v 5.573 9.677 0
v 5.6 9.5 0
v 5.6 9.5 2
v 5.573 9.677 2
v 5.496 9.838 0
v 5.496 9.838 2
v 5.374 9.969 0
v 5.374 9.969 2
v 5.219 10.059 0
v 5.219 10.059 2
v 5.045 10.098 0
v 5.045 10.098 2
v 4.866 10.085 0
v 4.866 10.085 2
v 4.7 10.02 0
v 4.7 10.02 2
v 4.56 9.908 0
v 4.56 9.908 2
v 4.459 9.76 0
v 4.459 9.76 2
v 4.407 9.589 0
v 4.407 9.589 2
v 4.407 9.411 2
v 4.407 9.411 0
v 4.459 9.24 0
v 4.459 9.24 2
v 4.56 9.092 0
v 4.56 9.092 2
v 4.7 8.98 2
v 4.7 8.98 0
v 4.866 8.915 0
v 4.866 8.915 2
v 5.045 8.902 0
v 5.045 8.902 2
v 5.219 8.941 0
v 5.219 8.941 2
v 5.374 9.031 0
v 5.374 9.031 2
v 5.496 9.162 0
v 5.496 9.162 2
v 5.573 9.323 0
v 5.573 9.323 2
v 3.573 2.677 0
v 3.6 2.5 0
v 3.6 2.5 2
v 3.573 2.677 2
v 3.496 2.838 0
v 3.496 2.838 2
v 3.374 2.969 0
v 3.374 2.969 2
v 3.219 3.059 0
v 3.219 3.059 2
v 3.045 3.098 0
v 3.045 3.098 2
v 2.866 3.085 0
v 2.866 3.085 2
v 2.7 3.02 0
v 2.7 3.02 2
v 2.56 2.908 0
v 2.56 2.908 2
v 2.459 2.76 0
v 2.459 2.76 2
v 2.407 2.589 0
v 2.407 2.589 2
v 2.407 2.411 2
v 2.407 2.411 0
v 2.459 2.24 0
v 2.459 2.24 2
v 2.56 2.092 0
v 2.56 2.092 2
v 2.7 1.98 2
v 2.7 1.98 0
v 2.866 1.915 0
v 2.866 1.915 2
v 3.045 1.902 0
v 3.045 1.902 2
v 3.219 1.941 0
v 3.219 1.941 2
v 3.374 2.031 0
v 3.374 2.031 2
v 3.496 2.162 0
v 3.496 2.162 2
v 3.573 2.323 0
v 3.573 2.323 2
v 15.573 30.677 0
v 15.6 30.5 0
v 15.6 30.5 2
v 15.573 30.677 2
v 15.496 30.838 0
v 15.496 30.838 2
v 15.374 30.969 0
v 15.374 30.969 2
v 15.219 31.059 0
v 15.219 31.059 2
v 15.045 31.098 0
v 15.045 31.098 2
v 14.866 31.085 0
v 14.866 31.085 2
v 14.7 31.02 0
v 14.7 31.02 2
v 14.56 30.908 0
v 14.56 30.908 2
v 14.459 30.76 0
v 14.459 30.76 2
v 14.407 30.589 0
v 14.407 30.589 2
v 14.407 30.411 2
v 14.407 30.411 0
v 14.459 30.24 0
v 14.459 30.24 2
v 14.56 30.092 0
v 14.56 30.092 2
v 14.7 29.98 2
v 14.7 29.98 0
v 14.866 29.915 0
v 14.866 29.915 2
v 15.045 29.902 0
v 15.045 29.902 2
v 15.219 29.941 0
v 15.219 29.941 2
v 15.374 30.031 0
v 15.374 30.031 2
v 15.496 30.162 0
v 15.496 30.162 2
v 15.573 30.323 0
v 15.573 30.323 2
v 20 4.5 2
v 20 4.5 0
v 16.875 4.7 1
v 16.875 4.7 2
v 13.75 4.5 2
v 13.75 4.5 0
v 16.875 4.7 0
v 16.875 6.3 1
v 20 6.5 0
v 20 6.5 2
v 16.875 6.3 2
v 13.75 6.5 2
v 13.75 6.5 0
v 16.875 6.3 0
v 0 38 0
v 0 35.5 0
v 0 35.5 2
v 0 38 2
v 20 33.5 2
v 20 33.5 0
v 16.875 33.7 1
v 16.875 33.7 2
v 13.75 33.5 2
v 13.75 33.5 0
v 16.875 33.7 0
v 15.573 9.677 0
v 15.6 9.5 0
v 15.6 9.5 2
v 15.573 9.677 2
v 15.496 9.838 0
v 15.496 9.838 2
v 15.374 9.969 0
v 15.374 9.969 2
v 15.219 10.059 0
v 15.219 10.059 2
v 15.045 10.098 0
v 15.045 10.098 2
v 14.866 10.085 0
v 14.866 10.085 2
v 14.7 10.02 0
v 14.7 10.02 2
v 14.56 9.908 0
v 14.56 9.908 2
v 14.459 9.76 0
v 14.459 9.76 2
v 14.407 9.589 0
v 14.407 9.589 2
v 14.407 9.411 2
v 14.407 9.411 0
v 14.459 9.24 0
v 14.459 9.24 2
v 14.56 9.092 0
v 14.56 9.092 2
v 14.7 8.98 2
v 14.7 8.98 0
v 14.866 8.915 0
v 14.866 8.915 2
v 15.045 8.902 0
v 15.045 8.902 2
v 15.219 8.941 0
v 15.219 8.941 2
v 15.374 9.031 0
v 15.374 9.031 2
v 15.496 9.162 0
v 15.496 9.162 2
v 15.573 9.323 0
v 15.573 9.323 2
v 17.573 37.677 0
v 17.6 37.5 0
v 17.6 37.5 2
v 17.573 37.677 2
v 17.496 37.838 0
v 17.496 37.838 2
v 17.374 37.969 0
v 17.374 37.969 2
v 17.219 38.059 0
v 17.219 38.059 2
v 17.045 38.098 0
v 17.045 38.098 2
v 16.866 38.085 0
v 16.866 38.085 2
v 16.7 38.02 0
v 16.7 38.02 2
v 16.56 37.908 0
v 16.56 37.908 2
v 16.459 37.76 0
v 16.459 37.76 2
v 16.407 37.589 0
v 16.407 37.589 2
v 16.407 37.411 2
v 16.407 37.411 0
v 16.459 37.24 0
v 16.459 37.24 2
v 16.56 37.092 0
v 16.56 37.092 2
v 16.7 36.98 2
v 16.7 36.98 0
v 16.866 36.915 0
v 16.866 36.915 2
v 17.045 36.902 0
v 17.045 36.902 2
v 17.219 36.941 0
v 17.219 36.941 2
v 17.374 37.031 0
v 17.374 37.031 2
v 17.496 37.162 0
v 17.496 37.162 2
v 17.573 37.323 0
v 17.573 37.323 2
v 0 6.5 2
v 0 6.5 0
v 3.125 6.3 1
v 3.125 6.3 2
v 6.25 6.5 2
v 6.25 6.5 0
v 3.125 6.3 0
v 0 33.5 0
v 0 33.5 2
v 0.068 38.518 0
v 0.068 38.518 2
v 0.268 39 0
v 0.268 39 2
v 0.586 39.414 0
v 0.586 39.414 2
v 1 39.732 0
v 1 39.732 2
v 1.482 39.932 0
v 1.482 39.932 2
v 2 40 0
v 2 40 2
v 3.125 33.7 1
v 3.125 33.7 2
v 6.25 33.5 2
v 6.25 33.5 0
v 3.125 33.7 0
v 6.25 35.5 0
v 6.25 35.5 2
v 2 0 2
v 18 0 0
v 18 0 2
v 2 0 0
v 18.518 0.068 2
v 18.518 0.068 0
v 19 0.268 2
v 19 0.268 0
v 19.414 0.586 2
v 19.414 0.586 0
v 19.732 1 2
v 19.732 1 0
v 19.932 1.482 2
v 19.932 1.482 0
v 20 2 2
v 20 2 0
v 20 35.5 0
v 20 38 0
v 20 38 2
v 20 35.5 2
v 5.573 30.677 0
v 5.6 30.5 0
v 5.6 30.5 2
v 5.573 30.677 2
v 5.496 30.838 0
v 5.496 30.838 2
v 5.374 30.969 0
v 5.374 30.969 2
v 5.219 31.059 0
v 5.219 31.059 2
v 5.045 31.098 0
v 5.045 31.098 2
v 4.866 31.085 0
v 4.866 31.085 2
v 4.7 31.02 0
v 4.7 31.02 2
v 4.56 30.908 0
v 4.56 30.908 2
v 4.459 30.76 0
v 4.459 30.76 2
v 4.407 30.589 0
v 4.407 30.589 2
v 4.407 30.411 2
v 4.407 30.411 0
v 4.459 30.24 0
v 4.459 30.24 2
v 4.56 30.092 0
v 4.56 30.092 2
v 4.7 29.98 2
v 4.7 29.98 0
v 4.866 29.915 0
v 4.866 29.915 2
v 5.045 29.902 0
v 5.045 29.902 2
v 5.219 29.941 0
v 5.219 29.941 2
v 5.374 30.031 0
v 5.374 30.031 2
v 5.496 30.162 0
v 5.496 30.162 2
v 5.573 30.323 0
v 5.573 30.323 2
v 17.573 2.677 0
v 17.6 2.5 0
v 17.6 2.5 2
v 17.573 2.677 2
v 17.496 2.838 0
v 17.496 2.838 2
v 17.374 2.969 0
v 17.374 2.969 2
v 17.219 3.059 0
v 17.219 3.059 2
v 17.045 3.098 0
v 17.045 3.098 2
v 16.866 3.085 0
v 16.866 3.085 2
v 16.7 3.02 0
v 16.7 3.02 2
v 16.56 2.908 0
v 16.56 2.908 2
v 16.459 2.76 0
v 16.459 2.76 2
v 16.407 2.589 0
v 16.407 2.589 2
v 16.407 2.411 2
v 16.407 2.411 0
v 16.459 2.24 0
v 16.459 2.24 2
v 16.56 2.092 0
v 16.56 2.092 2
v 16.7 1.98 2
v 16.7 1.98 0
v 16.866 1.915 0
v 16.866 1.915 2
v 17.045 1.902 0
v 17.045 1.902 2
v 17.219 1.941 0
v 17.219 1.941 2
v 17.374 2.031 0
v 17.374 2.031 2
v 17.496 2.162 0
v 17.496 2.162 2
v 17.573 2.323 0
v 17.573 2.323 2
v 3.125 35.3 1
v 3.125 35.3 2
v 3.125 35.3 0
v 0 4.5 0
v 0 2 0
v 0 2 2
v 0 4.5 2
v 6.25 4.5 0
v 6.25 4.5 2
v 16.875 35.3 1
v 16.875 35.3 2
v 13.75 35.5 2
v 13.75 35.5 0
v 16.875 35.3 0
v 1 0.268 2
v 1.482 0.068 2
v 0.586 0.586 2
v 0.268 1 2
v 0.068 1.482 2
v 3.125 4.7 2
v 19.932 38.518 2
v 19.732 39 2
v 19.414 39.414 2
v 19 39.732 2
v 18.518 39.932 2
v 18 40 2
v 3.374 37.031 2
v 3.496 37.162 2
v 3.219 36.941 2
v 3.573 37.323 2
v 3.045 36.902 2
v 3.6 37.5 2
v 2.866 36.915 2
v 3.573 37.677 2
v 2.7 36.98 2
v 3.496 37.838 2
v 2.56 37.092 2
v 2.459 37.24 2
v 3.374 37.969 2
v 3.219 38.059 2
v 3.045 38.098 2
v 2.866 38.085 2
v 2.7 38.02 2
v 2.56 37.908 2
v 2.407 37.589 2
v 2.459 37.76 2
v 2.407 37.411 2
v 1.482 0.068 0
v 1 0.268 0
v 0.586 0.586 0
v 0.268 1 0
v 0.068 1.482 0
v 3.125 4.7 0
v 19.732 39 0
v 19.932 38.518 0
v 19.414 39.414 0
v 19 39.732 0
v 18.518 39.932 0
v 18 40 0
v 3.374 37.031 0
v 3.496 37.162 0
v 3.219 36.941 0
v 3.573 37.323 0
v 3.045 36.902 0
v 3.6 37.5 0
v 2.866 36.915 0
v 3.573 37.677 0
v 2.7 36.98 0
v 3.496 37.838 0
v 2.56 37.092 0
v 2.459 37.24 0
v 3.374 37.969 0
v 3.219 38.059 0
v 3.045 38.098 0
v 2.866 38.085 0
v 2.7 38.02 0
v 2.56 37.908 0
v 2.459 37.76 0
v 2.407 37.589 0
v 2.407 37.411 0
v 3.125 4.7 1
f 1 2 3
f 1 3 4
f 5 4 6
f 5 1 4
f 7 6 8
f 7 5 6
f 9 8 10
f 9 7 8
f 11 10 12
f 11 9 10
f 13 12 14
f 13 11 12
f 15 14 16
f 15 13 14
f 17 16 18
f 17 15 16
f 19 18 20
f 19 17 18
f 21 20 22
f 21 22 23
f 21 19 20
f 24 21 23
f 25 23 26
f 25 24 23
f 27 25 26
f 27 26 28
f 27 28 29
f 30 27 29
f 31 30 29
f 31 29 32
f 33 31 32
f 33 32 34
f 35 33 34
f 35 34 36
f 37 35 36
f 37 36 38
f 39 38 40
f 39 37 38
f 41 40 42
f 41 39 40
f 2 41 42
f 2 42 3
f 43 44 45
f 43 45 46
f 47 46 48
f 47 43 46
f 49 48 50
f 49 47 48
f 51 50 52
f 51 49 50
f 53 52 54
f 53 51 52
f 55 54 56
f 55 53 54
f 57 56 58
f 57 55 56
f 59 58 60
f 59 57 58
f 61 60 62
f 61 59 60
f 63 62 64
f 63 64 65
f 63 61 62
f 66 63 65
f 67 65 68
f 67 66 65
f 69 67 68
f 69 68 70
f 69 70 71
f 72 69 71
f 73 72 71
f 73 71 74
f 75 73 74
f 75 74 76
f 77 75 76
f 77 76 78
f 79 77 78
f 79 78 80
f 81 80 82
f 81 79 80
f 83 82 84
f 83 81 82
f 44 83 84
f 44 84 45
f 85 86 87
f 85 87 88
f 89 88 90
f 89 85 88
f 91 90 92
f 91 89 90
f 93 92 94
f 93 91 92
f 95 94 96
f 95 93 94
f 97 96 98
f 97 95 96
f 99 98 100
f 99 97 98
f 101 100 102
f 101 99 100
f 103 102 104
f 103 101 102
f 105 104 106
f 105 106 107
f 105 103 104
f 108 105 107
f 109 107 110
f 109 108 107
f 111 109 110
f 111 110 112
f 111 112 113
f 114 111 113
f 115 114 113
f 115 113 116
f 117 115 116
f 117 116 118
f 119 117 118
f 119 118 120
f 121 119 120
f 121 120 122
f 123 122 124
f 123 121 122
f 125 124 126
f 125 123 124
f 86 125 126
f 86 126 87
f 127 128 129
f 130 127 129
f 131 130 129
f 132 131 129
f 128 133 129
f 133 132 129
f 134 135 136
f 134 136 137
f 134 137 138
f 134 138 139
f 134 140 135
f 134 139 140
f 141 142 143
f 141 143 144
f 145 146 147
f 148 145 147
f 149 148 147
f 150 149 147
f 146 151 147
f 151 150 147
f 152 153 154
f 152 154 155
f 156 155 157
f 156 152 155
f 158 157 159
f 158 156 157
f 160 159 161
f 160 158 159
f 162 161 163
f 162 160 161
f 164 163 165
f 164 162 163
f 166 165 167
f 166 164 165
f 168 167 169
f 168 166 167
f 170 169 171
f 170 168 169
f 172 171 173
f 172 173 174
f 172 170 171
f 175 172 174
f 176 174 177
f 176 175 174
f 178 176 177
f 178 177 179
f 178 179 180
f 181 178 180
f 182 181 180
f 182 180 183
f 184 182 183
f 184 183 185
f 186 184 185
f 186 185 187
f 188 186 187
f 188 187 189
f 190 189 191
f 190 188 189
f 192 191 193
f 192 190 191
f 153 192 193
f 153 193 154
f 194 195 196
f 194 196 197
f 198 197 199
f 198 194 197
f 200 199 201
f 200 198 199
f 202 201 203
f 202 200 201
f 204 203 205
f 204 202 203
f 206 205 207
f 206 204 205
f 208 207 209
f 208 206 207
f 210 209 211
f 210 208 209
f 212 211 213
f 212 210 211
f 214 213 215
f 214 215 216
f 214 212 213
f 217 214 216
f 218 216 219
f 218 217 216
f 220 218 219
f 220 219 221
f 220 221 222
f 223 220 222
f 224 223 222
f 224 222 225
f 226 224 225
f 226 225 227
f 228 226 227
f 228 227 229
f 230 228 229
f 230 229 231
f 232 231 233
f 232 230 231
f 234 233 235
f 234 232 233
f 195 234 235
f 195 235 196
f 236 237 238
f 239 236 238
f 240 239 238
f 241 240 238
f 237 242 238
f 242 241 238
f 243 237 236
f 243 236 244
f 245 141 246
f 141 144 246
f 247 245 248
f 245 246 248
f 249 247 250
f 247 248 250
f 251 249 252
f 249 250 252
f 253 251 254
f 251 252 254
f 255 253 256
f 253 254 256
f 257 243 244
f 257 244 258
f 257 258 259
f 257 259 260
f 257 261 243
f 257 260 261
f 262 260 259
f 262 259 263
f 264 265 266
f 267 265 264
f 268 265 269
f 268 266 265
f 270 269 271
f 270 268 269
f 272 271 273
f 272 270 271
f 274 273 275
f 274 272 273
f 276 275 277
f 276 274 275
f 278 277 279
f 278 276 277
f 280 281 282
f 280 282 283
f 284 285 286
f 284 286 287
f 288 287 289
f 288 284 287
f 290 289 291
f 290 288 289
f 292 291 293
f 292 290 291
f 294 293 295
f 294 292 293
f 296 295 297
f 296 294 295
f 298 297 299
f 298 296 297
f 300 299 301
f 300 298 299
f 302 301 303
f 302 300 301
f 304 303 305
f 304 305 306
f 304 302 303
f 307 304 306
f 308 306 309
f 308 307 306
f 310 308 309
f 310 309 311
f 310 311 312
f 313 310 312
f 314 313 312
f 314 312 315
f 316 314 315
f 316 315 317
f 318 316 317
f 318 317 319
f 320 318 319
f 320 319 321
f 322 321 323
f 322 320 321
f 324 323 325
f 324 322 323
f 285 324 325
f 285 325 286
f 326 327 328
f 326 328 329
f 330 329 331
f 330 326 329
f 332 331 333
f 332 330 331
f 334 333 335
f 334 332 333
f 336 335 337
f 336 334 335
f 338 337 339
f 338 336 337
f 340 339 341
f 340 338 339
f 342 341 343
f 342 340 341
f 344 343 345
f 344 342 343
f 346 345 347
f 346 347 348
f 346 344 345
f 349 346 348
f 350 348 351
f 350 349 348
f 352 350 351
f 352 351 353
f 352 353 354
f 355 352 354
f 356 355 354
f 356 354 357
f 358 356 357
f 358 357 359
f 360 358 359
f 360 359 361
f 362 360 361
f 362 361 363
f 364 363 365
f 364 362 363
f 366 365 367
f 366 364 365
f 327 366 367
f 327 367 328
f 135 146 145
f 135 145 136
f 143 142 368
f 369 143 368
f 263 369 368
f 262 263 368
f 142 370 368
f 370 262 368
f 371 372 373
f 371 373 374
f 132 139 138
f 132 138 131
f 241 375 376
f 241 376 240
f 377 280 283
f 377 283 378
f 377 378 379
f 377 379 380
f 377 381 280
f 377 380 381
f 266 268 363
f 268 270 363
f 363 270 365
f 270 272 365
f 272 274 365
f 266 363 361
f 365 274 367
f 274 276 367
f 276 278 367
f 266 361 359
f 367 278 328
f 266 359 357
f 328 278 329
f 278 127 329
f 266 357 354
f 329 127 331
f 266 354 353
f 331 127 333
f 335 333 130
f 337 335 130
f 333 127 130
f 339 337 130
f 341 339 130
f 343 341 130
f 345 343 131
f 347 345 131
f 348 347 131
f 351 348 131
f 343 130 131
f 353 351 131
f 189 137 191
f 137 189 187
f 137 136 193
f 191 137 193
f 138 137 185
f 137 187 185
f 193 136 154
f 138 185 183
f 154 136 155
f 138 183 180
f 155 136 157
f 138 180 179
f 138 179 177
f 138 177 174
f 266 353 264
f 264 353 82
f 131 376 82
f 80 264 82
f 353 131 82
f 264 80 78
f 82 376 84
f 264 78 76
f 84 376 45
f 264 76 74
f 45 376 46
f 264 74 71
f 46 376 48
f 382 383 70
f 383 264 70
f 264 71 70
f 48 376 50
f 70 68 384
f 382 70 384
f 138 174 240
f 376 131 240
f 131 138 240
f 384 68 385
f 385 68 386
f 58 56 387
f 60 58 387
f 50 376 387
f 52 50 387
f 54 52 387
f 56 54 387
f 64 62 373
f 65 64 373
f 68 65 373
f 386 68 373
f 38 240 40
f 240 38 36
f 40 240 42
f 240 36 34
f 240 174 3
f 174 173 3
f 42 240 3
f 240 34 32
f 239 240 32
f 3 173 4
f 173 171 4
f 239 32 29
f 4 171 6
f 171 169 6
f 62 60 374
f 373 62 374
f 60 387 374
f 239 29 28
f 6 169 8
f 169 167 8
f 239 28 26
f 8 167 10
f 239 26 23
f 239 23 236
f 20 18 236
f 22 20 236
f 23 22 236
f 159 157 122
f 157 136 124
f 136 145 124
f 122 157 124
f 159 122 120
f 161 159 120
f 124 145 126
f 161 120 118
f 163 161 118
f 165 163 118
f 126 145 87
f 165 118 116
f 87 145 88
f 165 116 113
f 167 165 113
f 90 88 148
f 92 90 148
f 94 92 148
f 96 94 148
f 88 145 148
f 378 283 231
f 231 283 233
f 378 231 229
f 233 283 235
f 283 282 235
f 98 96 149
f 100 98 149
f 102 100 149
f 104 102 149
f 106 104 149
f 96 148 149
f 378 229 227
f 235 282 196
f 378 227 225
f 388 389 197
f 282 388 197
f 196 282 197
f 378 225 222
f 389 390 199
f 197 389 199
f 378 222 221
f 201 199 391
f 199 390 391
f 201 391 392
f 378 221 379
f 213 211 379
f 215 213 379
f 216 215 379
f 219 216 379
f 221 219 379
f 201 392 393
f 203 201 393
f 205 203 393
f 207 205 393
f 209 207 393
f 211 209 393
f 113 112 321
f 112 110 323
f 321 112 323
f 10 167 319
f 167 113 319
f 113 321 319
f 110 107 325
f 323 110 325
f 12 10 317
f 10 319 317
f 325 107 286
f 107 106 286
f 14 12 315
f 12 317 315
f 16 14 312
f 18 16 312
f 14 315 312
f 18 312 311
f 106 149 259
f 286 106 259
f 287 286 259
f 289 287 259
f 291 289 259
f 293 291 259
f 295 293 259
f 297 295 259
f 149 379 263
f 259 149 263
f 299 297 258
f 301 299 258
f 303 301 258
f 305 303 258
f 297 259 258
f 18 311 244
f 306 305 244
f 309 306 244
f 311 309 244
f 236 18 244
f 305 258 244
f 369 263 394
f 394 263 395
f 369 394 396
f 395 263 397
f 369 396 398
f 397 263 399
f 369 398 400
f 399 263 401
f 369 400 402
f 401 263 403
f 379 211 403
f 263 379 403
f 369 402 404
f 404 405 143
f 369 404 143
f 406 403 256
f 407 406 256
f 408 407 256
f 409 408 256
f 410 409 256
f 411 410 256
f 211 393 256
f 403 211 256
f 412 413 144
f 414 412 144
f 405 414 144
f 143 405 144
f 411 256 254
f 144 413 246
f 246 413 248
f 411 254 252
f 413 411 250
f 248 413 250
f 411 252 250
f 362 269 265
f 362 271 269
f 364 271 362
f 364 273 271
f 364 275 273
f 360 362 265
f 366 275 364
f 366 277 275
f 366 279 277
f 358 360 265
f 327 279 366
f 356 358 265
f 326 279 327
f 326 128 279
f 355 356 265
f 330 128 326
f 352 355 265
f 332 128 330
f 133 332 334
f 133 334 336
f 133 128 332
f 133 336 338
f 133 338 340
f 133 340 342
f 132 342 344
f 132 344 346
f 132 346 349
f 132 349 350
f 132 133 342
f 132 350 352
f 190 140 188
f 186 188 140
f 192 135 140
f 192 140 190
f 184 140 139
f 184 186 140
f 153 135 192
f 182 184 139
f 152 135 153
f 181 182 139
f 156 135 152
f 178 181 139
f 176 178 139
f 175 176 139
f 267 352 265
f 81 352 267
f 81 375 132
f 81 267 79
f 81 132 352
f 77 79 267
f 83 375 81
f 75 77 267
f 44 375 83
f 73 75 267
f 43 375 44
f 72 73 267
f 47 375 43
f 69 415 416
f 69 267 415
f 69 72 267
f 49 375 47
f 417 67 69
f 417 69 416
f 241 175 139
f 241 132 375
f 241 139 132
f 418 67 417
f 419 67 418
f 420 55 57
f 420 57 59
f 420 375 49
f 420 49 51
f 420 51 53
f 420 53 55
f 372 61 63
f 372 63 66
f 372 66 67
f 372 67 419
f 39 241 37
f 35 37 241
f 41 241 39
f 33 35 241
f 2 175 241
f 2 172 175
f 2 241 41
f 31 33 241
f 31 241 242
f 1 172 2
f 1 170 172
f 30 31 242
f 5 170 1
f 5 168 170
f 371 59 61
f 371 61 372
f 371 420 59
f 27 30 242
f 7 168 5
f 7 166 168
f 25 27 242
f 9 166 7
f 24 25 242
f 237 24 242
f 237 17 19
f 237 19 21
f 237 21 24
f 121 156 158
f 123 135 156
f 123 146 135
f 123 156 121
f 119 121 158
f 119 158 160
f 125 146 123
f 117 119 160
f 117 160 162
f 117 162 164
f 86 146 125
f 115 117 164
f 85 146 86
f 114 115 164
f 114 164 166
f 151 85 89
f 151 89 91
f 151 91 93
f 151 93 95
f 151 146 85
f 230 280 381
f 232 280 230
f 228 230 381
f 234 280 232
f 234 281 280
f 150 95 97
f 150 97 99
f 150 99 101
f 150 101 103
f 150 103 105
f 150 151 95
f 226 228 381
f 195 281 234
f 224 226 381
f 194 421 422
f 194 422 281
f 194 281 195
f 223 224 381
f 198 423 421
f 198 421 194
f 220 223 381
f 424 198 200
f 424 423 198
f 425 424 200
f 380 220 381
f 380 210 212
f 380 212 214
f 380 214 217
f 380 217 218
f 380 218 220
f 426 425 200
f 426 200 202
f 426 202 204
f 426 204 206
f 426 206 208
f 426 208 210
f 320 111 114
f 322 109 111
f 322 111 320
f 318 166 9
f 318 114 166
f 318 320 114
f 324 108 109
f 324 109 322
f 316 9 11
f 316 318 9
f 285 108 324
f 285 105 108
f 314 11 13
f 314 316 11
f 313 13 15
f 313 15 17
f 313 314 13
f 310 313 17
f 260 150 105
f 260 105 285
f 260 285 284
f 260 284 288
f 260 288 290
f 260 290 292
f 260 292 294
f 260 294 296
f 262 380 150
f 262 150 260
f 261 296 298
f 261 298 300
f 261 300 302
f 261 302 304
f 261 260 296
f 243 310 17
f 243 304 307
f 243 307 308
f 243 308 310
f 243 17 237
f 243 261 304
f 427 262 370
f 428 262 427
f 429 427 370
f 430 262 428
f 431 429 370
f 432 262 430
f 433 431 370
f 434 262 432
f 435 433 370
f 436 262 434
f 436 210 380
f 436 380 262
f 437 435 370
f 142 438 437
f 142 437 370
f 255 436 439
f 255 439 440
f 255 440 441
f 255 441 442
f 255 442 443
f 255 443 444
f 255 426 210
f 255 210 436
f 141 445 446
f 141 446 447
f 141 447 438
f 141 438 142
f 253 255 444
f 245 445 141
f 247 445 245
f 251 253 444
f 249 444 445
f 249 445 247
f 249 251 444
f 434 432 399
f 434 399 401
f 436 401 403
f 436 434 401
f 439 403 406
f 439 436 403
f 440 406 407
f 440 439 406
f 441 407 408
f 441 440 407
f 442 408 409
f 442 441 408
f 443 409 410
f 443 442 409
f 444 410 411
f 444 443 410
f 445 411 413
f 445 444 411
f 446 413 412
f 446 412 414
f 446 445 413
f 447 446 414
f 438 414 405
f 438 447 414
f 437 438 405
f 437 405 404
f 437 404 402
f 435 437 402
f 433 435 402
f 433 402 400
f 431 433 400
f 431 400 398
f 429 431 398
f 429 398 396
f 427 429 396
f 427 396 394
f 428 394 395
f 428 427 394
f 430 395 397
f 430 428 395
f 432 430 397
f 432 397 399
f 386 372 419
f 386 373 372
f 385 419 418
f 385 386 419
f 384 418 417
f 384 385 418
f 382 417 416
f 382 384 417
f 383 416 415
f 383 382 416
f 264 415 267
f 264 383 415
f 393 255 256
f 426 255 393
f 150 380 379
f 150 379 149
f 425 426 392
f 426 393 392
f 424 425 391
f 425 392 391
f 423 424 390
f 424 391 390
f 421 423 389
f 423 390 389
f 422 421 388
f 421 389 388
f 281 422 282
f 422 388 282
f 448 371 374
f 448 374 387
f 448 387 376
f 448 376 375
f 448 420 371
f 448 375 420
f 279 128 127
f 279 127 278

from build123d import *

# Parameters (mm, degrees)
SKETCH1_R               = 0.6
FINGER_PIP_BODY_DEPTH   = 2
FINGER_PIP_CONTOURING_R = 2


with BuildPart() as part:
    # Sketch1 → Finger PIP Body (new body)
    with BuildSketch(Plane.XY):
        with BuildLine():
            Line((0, 6.5), (0, 33.5))
            add(Edge.make_bspline(
                [(0, 33.5), (3.125, 33.9), (6.25, 33.5)],
                knots=[0, 0, 0, 1, 1, 1], degree=2))
            Line((6.25, 33.5), (6.25, 35.5))
            add(Edge.make_bspline(
                [(0, 35.5), (3.125, 35.1), (6.25, 35.5)],
                knots=[0, 0, 0, 1, 1, 1], degree=2))
            Line((0, 35.5), (0, 40))
            Line((0, 40), (20, 40))
            Line((20, 40), (20, 35.5))
            add(Edge.make_bspline(
                [(20, 35.5), (16.875, 35.1), (13.75, 35.5)],
                knots=[0, 0, 0, 1, 1, 1], degree=2))
            Line((13.75, 35.5), (13.75, 33.5))
            add(Edge.make_bspline(
                [(20, 33.5), (16.875, 33.9), (13.75, 33.5)],
                knots=[0, 0, 0, 1, 1, 1], degree=2))
            Line((20, 33.5), (20, 6.5))
            add(Edge.make_bspline(
                [(20, 6.5), (16.875, 6.1), (13.75, 6.5)],
                knots=[0, 0, 0, 1, 1, 1], degree=2))
            Line((13.75, 6.5), (13.75, 4.5))
            add(Edge.make_bspline(
                [(20, 4.5), (16.875, 4.9), (13.75, 4.5)],
                knots=[0, 0, 0, 1, 1, 1], degree=2))
            Line((20, 4.5), (20, 0))
            Line((20, 0), (0, 0))
            Line((0, 0), (0, 4.5))
            add(Edge.make_bspline(
                [(0, 4.5), (3.125, 4.9), (6.25, 4.5)],
                knots=[0, 0, 0, 1, 1, 1], degree=2))
            Line((6.25, 4.5), (6.25, 6.5))
            add(Edge.make_bspline(
                [(0, 6.5), (3.125, 6.1), (6.25, 6.5)],
                knots=[0, 0, 0, 1, 1, 1], degree=2))
        make_face()
        with Locations((3, 2.5)):
            Circle(SKETCH1_R, mode=Mode.SUBTRACT)
        with Locations((5, 9.5)):
            Circle(SKETCH1_R, mode=Mode.SUBTRACT)
        with Locations((5, 30.5)):
            Circle(SKETCH1_R, mode=Mode.SUBTRACT)
        with Locations((3, 37.5)):
            Circle(SKETCH1_R, mode=Mode.SUBTRACT)
        with Locations((17, 37.5)):
            Circle(SKETCH1_R, mode=Mode.SUBTRACT)
        with Locations((15, 30.5)):
            Circle(SKETCH1_R, mode=Mode.SUBTRACT)
        with Locations((15, 9.5)):
            Circle(SKETCH1_R, mode=Mode.SUBTRACT)
        with Locations((17, 2.5)):
            Circle(SKETCH1_R, mode=Mode.SUBTRACT)
    extrude(amount=FINGER_PIP_BODY_DEPTH)

    # Finger PIP Contouring
    finger_pip_contouring_edges = [part.edges().sort_by_distance(p)[0] for p in [
        (0, 40, 1),
        (20, 40, 1),
        (20, 0, 1),
        (0, 0, 1),
    ]]
    fillet(finger_pip_contouring_edges, radius=FINGER_PIP_CONTOURING_R)


solid = part.part
